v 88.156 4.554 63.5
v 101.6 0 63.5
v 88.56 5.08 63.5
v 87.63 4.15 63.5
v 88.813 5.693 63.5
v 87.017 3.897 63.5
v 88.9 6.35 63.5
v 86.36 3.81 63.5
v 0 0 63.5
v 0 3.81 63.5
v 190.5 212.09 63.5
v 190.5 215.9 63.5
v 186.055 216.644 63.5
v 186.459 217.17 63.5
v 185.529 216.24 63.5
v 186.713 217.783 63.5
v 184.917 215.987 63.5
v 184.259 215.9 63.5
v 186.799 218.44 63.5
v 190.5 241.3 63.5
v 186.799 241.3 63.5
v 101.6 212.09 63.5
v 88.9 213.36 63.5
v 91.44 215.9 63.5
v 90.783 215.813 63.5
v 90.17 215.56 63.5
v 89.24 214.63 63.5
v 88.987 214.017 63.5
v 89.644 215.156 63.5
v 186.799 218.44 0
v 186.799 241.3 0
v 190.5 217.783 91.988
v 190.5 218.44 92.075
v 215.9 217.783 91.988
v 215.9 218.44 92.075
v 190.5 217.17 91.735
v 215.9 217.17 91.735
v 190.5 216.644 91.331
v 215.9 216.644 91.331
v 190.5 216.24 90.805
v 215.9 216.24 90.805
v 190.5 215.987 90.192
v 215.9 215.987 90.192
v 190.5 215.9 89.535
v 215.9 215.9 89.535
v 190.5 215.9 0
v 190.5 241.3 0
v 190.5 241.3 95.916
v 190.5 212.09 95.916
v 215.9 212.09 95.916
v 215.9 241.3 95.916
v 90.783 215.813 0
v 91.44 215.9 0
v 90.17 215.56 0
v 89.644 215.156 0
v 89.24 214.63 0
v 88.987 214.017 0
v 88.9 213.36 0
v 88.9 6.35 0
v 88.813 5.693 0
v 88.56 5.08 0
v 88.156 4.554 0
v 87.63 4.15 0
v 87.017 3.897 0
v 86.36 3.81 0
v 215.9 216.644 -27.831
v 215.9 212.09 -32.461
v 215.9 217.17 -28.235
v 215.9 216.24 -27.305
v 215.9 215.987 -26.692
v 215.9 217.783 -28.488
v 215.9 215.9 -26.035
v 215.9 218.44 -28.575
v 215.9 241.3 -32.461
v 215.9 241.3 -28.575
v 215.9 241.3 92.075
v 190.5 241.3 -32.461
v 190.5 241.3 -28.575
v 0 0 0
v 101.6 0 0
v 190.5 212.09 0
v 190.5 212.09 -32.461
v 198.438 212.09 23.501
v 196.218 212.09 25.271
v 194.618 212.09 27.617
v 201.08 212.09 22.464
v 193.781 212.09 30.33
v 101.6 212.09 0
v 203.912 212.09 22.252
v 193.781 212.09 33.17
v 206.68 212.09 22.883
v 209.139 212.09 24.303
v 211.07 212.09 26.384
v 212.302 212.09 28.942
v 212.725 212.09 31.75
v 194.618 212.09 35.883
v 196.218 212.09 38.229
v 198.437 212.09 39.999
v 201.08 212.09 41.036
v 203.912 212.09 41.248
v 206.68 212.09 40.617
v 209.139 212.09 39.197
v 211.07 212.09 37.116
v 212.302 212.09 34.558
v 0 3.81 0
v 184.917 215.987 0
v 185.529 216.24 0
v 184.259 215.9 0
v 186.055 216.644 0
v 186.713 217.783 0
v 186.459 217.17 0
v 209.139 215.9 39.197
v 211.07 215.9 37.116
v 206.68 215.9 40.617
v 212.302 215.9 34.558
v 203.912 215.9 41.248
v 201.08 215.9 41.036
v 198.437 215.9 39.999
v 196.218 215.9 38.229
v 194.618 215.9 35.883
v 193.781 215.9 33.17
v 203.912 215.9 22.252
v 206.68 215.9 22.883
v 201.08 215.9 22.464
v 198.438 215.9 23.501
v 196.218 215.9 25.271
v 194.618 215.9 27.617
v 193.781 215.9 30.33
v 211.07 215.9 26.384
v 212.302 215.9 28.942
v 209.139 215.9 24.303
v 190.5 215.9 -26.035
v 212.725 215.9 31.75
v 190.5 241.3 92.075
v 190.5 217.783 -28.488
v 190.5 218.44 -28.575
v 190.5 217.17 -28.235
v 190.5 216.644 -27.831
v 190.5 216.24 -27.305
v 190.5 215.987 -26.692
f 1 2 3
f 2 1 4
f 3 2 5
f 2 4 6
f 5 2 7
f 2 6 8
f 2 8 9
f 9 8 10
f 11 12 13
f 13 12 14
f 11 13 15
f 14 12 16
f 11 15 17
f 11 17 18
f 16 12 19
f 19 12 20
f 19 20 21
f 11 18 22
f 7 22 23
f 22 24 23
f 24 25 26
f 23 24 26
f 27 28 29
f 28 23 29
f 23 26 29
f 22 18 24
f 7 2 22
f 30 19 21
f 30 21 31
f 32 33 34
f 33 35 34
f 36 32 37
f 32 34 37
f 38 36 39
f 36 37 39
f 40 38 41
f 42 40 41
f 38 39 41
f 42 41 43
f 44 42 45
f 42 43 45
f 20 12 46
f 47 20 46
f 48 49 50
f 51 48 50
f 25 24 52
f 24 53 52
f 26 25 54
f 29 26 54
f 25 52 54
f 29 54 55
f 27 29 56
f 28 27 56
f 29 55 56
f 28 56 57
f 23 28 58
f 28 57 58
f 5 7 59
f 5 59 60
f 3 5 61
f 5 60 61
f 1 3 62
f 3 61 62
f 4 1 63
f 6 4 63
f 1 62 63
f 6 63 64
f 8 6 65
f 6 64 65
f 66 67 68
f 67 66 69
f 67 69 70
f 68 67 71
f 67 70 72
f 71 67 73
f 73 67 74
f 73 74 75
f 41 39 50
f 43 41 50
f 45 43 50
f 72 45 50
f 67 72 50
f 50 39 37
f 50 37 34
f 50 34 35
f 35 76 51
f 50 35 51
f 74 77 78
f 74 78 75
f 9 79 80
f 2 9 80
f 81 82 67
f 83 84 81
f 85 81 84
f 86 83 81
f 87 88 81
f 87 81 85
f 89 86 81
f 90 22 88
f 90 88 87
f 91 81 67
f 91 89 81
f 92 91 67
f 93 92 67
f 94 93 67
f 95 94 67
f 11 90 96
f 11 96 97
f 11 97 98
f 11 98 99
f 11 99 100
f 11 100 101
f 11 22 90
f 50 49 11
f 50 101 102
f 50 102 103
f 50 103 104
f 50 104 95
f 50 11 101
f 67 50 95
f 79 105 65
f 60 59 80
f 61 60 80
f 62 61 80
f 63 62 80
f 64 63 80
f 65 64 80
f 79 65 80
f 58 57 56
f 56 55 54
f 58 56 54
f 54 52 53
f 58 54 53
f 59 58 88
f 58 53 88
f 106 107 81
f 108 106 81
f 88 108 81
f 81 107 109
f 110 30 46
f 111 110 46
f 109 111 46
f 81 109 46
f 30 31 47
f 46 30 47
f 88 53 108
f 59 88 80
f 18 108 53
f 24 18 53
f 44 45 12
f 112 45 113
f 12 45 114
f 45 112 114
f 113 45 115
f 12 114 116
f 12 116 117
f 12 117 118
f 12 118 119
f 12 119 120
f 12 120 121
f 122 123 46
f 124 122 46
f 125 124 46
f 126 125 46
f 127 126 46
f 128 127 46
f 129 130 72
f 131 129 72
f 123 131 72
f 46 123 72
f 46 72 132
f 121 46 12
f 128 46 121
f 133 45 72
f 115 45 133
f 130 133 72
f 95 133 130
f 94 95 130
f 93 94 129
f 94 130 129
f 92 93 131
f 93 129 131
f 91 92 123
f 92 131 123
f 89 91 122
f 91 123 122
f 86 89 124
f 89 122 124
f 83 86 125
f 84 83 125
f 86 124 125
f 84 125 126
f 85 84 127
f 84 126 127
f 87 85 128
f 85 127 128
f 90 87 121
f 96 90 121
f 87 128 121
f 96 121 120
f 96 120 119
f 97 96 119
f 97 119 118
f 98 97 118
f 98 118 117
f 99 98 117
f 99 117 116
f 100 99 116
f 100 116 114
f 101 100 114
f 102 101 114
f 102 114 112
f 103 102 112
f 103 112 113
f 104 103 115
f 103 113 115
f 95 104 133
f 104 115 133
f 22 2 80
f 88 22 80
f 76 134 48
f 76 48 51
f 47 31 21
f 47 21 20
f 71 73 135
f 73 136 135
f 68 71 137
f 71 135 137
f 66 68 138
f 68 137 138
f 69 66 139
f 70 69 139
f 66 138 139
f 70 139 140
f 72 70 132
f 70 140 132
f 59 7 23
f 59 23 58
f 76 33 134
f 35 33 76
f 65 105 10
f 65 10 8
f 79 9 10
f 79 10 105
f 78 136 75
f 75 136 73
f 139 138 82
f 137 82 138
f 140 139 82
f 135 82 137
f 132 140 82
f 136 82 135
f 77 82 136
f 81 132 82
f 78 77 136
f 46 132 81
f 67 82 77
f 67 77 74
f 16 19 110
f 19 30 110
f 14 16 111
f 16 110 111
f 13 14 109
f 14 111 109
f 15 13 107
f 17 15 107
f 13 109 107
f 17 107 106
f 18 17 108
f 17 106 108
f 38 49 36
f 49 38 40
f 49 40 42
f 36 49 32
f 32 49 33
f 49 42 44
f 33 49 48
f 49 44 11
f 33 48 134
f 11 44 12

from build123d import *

# Parameters (mm, degrees)
SKETCH1_W           = 101.6
SKETCH1_H           = 63.5
BOSS_EXTRUDE1_DEPTH = 3.81
SKETCH2_W           = 12.7
SKETCH2_H           = 63.5
BOSS_EXTRUDE2_DEPTH = 212.09
SKETCH3_R           = 9.525
BOSS_EXTRUDE3_DEPTH = 3.81
SKETCH4_W           = 25.4
SKETCH4_H           = 3.841083916
SKETCH4_W_2         = 3.700866251
SKETCH4_H_2         = 63.5
SKETCH4_H_3         = 3.885733648
BOSS_EXTRUDE6_DEPTH = 25.4
SKETCH6_W           = 25.4
SKETCH6_H           = 3.885733648
SKETCH6_H_2         = 3.841083916
BOSS_EXTRUDE7_DEPTH = 3.81
FILLET2_R           = 2.54


with BuildPart() as part:
    # Sketch1 → Boss-Extrude1 (new body)
    with BuildSketch(Plane(origin=(0, 0, 0), x_dir=(1, 0, 0), z_dir=(0, 1, 0))):
        with Locations((50.8, -31.75)):
            Rectangle(SKETCH1_W, SKETCH1_H)
    extrude(amount=BOSS_EXTRUDE1_DEPTH)

    # Sketch2 → Boss-Extrude2 (add)
    with BuildSketch(Plane(origin=(0, 3.81, 0), x_dir=(1, 0, 0), z_dir=(0, 1, 0))):
        with Locations((95.25, -31.75)):
            Rectangle(SKETCH2_W, SKETCH2_H)
    extrude(amount=BOSS_EXTRUDE2_DEPTH)

    # Sketch3 → Boss-Extrude3 (add)
    with BuildSketch(Plane(origin=(0, 215.9, 0), x_dir=(1, 0, 0), z_dir=(0, 1, 0))):
        Polygon((101.6, 0), (190.5, 0), (190.5, 28.575), (203.2, 28.575), (215.9, 28.575), (215.9, -92.075), (203.2, -92.075), (190.5, -92.075), (190.5, -63.5), (101.6, -63.5), align=None)
        with Locations((203.2, -31.75)):
            Circle(SKETCH3_R, mode=Mode.SUBTRACT)
    extrude(amount=-BOSS_EXTRUDE3_DEPTH)

    # Sketch4 → Boss-Extrude6 (add)
    with BuildSketch(Plane(origin=(0, 215.9, 0), x_dir=(1, 0, 0), z_dir=(0, 1, 0))):
        with Locations((203.2, -93.995541958)):
            Rectangle(SKETCH4_W, SKETCH4_H)
        with Locations((188.649566875, -31.75)):
            Rectangle(SKETCH4_W_2, SKETCH4_H_2)
        with Locations((203.2, 30.517866824)):
            Rectangle(SKETCH4_W, SKETCH4_H_3)
    extrude(amount=BOSS_EXTRUDE6_DEPTH)

    # Sketch6 → Boss-Extrude7 (add)
    with BuildSketch(Plane.XZ.offset(-215.9)):
        with Locations((203.2, -30.517866824)):
            Rectangle(SKETCH6_W, SKETCH6_H)
        with Locations((203.2, 93.995541958)):
            Rectangle(SKETCH6_W, SKETCH6_H_2)
    extrude(amount=BOSS_EXTRUDE7_DEPTH)

    # Fillet2
    fillet2_edges = [part.edges().sort_by_distance(p)[0] for p in [
        (203.2, 215.9, -28.575),
        (88.9, 215.9, 31.75),
        (88.9, 3.81, 31.75),
        (186.799133749, 215.9, 31.75),
        (203.2, 215.9, 92.075),
    ]]
    fillet(fillet2_edges, radius=FILLET2_R)


solid = part.part
